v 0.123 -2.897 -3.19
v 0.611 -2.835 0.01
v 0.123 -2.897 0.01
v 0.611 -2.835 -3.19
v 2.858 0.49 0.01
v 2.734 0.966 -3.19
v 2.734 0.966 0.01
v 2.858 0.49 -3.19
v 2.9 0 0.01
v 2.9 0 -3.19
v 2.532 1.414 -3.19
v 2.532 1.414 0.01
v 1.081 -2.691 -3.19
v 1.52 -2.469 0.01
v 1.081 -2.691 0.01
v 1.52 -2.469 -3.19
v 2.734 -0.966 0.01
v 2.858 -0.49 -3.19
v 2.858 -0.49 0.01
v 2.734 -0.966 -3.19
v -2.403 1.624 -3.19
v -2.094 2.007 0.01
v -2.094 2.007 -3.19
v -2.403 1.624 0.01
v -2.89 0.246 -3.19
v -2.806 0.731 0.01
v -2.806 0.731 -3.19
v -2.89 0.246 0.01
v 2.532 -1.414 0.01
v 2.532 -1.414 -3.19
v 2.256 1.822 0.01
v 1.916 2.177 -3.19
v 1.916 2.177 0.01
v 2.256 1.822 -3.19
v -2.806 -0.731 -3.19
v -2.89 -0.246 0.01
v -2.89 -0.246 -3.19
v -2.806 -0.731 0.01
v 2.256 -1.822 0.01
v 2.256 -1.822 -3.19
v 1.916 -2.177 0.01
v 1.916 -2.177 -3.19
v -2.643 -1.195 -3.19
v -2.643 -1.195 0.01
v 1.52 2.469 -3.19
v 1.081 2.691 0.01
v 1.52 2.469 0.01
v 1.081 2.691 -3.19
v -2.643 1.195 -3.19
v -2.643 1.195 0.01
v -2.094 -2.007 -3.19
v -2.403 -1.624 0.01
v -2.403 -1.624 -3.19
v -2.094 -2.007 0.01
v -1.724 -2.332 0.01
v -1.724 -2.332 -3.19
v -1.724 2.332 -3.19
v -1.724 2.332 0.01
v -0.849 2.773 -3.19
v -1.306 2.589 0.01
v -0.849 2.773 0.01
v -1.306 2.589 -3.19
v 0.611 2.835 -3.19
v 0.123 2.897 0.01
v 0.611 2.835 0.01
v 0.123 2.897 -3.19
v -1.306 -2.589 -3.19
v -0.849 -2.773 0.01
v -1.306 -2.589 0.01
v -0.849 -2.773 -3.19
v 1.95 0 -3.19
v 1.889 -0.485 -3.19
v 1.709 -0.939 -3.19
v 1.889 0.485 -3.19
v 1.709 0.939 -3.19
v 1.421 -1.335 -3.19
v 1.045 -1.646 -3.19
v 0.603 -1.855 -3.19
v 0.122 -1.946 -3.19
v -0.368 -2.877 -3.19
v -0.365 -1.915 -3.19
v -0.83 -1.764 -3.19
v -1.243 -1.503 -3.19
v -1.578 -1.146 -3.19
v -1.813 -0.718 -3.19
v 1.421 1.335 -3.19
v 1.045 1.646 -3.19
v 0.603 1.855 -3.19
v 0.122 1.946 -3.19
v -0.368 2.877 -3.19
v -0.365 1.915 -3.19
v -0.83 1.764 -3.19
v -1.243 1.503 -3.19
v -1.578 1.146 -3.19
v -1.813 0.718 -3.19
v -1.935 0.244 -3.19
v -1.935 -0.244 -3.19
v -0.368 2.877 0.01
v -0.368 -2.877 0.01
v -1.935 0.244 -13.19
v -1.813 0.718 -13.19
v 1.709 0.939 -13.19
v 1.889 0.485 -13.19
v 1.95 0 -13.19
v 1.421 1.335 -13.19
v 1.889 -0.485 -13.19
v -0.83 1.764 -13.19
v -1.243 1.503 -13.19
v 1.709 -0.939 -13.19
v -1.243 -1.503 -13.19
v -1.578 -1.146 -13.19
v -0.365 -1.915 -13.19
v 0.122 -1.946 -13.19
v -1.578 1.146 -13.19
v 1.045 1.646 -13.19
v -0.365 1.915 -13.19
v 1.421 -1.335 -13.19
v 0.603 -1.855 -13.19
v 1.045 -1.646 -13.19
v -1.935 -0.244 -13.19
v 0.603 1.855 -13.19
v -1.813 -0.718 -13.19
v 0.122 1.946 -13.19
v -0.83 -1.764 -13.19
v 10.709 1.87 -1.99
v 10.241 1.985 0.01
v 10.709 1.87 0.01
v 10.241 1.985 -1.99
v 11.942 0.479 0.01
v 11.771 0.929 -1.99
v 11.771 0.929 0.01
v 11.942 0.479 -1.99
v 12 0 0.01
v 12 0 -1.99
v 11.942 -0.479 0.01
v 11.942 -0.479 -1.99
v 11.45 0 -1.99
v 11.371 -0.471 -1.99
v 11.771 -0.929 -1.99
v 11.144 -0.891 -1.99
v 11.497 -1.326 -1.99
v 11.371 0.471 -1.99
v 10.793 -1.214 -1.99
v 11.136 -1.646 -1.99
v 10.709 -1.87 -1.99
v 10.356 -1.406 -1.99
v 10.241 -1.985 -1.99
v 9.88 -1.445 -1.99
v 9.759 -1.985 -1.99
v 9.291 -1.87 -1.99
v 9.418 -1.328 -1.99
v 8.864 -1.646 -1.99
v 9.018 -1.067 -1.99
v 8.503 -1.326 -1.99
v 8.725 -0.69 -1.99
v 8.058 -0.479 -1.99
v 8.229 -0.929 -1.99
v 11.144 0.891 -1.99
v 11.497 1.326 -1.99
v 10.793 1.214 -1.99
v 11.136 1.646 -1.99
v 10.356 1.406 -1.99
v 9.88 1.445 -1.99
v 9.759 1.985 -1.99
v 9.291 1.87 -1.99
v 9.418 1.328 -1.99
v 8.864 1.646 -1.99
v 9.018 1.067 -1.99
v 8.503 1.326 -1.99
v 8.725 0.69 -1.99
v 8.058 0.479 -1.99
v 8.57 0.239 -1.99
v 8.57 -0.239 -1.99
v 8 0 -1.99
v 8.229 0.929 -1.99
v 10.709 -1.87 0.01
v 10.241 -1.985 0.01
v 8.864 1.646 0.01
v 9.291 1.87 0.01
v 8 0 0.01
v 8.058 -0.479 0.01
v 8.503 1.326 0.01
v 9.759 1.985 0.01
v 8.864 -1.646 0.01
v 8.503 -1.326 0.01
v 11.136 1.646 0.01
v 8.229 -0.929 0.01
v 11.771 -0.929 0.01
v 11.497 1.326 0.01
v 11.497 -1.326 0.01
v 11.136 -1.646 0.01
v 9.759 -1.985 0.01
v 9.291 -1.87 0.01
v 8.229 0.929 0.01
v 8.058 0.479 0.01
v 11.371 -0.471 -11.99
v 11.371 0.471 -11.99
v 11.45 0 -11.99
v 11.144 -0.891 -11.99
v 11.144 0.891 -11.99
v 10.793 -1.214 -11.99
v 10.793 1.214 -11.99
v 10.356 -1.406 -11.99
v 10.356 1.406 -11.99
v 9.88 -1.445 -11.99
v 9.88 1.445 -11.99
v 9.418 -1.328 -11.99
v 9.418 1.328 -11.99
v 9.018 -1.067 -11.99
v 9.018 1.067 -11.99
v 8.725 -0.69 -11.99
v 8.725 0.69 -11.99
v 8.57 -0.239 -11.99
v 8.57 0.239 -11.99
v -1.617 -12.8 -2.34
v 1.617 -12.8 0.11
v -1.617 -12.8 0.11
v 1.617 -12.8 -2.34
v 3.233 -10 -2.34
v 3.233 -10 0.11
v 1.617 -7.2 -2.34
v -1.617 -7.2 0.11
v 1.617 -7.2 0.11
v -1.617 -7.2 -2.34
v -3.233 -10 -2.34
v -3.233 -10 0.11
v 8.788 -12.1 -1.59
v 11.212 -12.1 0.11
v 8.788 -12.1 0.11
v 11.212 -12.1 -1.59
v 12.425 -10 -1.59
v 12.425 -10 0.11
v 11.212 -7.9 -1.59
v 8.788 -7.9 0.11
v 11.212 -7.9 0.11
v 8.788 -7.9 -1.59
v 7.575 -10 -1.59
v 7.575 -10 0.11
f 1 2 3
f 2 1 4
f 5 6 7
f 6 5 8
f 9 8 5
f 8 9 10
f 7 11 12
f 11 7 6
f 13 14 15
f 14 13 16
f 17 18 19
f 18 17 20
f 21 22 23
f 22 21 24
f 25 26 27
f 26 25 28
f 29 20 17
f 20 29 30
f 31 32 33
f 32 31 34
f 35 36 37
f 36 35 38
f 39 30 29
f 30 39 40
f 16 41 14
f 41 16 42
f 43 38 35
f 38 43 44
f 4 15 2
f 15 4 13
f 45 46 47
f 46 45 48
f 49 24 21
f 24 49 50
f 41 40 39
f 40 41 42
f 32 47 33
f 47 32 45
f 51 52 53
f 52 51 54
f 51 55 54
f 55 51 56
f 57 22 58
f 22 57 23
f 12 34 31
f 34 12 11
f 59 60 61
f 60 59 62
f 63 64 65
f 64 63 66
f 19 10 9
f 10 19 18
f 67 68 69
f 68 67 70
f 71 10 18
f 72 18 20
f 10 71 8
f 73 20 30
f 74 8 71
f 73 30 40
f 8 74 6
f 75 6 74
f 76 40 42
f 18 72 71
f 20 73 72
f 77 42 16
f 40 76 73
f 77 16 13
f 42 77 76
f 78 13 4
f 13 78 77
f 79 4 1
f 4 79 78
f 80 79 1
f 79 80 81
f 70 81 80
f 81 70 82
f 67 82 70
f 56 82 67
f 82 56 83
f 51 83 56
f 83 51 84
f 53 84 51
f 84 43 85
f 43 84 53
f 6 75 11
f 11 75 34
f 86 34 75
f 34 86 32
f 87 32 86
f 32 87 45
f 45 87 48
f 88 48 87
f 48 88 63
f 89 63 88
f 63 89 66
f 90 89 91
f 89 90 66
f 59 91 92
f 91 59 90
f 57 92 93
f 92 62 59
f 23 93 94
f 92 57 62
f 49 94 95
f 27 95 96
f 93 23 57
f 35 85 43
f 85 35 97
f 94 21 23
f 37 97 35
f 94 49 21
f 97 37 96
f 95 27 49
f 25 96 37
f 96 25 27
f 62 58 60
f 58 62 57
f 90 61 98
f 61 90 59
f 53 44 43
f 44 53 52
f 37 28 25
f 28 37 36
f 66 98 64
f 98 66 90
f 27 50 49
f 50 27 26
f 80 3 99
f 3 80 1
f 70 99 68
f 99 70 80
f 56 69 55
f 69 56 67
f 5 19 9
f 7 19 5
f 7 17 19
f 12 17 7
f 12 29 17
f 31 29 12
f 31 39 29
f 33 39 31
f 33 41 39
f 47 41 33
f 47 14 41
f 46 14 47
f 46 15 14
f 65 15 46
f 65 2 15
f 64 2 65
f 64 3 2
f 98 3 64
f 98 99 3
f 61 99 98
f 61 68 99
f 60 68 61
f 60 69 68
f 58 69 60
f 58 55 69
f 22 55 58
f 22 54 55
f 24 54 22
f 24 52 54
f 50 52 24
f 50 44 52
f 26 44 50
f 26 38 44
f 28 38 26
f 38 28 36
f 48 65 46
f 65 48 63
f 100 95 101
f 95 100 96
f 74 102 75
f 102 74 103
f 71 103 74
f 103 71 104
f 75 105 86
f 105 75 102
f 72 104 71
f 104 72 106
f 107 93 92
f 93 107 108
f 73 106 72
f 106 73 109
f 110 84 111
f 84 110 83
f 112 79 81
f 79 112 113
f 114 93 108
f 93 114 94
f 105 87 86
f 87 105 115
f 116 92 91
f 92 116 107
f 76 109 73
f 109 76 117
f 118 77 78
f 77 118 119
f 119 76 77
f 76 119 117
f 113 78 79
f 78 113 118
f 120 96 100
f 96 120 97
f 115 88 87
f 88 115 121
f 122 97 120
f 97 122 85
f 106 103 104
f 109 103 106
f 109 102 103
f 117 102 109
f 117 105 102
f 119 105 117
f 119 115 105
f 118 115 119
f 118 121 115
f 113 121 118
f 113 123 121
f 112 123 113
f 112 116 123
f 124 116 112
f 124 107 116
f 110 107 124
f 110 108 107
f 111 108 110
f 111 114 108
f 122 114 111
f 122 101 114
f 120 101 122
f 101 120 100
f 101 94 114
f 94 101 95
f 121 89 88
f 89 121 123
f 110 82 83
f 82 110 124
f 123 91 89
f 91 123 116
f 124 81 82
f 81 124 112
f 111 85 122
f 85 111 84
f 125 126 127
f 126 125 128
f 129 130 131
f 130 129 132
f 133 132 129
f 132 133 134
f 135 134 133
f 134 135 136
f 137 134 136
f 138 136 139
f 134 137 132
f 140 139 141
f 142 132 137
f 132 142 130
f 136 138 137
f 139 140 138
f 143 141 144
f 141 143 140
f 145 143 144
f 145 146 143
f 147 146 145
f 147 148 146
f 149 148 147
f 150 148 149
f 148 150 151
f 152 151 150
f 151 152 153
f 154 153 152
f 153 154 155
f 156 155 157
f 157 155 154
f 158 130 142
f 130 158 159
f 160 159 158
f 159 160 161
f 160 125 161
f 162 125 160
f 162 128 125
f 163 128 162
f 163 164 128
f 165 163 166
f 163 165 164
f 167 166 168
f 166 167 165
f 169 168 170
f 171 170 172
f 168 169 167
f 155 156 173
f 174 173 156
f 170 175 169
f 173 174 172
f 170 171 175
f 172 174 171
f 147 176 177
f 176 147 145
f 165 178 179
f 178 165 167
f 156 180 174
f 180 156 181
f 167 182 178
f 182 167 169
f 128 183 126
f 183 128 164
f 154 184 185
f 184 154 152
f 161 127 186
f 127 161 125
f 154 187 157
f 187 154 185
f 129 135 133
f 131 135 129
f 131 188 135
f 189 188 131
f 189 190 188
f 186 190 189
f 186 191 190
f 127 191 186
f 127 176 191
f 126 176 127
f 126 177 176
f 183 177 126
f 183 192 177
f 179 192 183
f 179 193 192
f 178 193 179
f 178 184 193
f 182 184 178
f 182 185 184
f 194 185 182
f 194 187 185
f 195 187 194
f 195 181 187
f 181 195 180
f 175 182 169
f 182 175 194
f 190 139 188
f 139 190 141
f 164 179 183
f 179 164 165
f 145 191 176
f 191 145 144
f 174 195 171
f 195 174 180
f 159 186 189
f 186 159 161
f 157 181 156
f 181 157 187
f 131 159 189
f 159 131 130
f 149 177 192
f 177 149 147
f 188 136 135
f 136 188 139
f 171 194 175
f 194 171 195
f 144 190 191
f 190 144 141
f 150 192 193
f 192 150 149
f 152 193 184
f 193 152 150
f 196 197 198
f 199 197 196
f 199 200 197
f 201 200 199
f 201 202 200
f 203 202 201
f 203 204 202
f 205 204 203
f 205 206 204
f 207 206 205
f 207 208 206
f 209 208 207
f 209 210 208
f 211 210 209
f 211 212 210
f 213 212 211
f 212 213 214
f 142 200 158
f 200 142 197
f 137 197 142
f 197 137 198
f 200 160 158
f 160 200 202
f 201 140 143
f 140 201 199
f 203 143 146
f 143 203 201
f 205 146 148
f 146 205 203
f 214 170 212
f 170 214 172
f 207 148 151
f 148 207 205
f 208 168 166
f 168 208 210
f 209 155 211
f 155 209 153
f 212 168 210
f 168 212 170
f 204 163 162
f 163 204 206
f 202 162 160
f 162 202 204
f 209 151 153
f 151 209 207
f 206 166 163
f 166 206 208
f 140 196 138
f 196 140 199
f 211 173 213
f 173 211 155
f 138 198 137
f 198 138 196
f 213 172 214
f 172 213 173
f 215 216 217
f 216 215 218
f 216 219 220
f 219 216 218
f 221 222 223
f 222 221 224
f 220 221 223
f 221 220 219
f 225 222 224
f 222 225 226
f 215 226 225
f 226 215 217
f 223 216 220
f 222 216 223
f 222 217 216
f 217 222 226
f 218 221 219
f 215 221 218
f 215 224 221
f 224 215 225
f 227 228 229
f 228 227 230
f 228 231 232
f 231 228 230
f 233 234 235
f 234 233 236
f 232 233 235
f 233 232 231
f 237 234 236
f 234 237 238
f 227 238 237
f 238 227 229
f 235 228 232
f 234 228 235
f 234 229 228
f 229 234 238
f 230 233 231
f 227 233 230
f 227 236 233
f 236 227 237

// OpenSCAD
// file: ../Polygon.scad
//============================================================
// OpenSCAD
// Regular Convex Polygon Library
// Last Modified : 2015/10/28
//============================================================
/*

	Definition

	N = Number of Side N >=3
	A = apothem
		radius of inside circle
	R = circumradius
		Radius of outside circle
	S = Side
		Lenght of a side

	Build polygon with the Apothem :
	N and A is known
	Need to calculate S then R
	use $fn

	Build Polygon with Circumradius
	N and R known
	use $fn

	Build Polygon with Side
	N and S Known
	Need to calculate R and optionaly A
	use $fn	

	TO DO
    Control result

	For more information :
	http://en.wikipedia.org/wiki/Regular_polygon

*/

//------------------------------------------------------------
//
//------------------------------------------------------------
Demo();

//------------------------------------------------------------
// Demo
//------------------------------------------------------------
module Demo()
{
	inch = 25.4;	// 25.4mm
	// A = apothem - it's a RADIUS !
	// For a bolt of 4 inches spécify A=2*inch
	//Polygon(N=7,A=2*inch,h=0);	// 4 inches radius Polygon
	//Polygon(N=7,A=49.8365,h=0);
	//Trigon(A=50,h=10);			// N=3
	//Dodecagon(A=50,h=0);			// N=12

    //rotate([0,0,360/7/2])
	//Nonagon(R=55.3144,h=10,debug=true);

	//Polygon(N=6,A=60,h=0,debug=false);
	//Polygon(N=6,A=60,h=5,debug=true);

    Enneagon(A=50);
}


//------------------------------------------------------------
// Polygon : 
//------------------------------------------------------------
module Polygon(N=3,A=0,R=0,S=0,h=0,debug=false)
{
	N = ( N < 3 ? 3 : N );

	angle = 360/N;
	angleA = angle/2;

	if (debug)
	{
		echo("N = ", N);
		echo("A = ", A);
		echo("S = ", S);
		echo("R = ", R);
	}

	if ( A > 0 )		// if A assign R and S
	{
        S = 2 * A * tan(angleA);							// assign
		//R = (S/2) / sin(angleA);						// no assign ???
		R = ( A * tan(angleA) ) / sin(angleA);		// asign
		_Build_Polygon(N=N,R=R,h=h);
		if (debug)
		{
			echo("aN = ", N);
			echo("aA = ", A);
			echo("aS = ", S);
			echo("aR = ", R);
			#cylinder(r=A,h=h+1,center=true,$fn=150);
			%cylinder(r=R,h=h+1,center=true,$fn=150);
		}
	}
	else
	{
		if ( S > 0 )		// if S assign R and A
		{
			R = (S/2) / sin(angleA);			// assign
			A = S / ( 2 * tan(angleA) );		// assign
            _Build_Polygon(N=N,R=R,h=h);
			if (debug)
			{
				echo("sN = ", N);
				echo("sA = ", A);
				echo("sS = ", S);
				echo("sR = ", R);
				#cylinder(r=A,h=h+1,center=true,$fn=150);
				%cylinder(r=R,h=h+1,center=true,$fn=150);
			}
		}
		else
		{
			if ( R == 0 )		// default
			{
				S = 2 * R * sin(angleA);			// no assign ???
				A = S / ( 2 * tan(angleA) );		// no assign ???
				_Build_Polygon(N=N,h=h);
				if (debug)
				{
					echo("0N = ", N);
					echo("0A = ", A);
					echo("0S = ", S);
					echo("0R = ", R);
					#cylinder(r=A,h=h+1,center=true,$fn=150);
					%cylinder(r=R,h=h+1,center=true,$fn=150);
				}
			}
			else		// build with R
			{
				S = 2 * R * sin(angleA);
				A = S / ( 2 * tan(angleA) );			// no assign ???
				//A = R * ( sin(angleA) / tan(angleA) )	// no assign ???
				_Build_Polygon(N=N,R=R,h=h);
				if (debug)
				{
					echo("rN = ", N);
					echo("rA = ", A);
					echo("rS = ", S);
					echo("rR = ", R);
					%cylinder(r=R,h=h+1,center=true,$fn=150);
				}
			}
		}
	}

	if (debug)
	{
		echo("fN = ", N);
		echo("fA = ", A);
		echo("fS = ", S);
		echo("fR = ", R);
	}
}

//------------------------------------------------------------
// Build
//------------------------------------------------------------
module _Build_Polygon(N=3,R=1,h=0)
{
	if (h > 0)
	{
		// 3D primitive h>0
		cylinder(r=R,h=h,$fn=N,center=true);
	}
	else
	{
		// 2D primitive h=0
		circle(r=R,$fn=N,center=true);
	}
}

//------------------------------------------------------------
// Building lots from N=3, N=N+1
// http://en.wikipedia.org/wiki/Polygon
//------------------------------------------------------------

// 3 sides
module Trigon(A=0,R=0,S=0,h=0,debug=false)
	{Polygon(N=3,A=A,R=R,S=S,h=h,debug=debug);}

module Triangle(A=0,R=0,S=0,h=0,debug=false)
	{Polygon(N=3,A=A,R=R,S=S,h=h,debug=debug);}

// 4 sides
module Tetragon(A=0,R=0,S=0,h=0,debug=false)
	{Polygon(N=4,A=A,R=R,S=S,h=h,debug=debug);}

module Quadrilateral(A=0,R=0,S=0,h=0,debug=false)
	{Polygon(N=4,A=A,R=R,S=S,h=h,debug=debug);}

module Quadrangle(A=0,R=0,S=0,h=0,debug=false)
	{Polygon(N=4,A=A,R=R,S=S,h=h,debug=debug);}

// 5 sides
module Pentagon(A=0,R=0,S=0,h=0,debug=false)
	{Polygon(N=5,A=A,R=R,S=S,h=h,debug=debug);}

// 6 sides
module Hexagon(A=0,R=0,S=0,h=0,debug=false)
	{Polygon(N=6,A=A,R=R,S=S,h=h,debug=debug);}

// 7 sides
module Heptagon(A=0,R=0,S=0,h=0,debug=false)
	{Polygon(N=7,A=A,R=R,S=S,h=h,debug=debug);}

// 8 sides
module Octagon(A=0,R=0,S=0,h=0,debug=false)
	{Polygon(N=8,A=A,R=R,S=S,h=h,debug=debug);}

// 9 sides
module Enneagon(A=0,R=0,S=0,h=0,debug=false)
	{Polygon(N=9,A=A,R=R,S=S,h=h,debug=debug);}

module Nonagon(A=0,R=0,S=0,h=0,debug=false)
	{Polygon(N=9,A=A,R=R,S=S,h=h,debug=debug);}

// 10 sides
module Decagon(A=0,R=0,S=0,h=0,debug=false)
	{Polygon(N=10,A=A,R=R,S=S,h=h,debug=debug);}

// 11 sides
module Handecagon(A=0,R=0,S=0,h=0,debug=false)
	{Polygon(N=11,A=A,R=R,S=S,h=h,debug=debug);}

// 12 sides
module Dodecagon(A=0,R=0,S=0,h=0,debug=false)
	{Polygon(N=12,A=A,R=R,S=S,h=h,debug=debug);}

// ...

// 100 sides
module Hectogon(A=0,R=0,S=0,h=0,debug=false)
	{Polygon(N=100,A=A,R=R,S=S,h=h,debug=debug);}

//==EOF=======================================================
// file: ../Bolt.scad
include <defaults.scad>;

module Bolt(
  l=10,
  h_head=5,
  d_head=10,
  d=5,
  tolerance=default_metric_tolerance,
  inset=1,
  extra_tolerance=default_bolt_extra_tolerance
) {
  r_head = d_head/2;
  r = d/2;

  translate([0, 0, -inset*h_head]){
    translate([0, 0, 0.01])
    cylinder(r=r_head+tolerance*2, h=h_head);

    translate([0, 0, -l+0.01])
    cylinder(r=r+tolerance*2+extra_tolerance, h=l+0.01);
  }
}
// file: ../Nut.scad
include <defaults.scad>;
use <Polygon.scad>;

module Nut(
  h=10,
  A=10,
  tolerance=default_metric_tolerance,
  inset=1
) {
  translate([0, 0, -h/2+0.01+((1-inset)*h)])
  Hexagon(
    A=A+tolerance,
    h=h+tolerance*2
  );
}
// file: ../defaults.scad
default_metric_tolerance = 0.1;
default_bolt_extra_tolerance = 0.25;
// file: ../M2.scad
include <defaults.scad>;
use <Nut.scad>;
use <Bolt.scad>;

h_nut_m2 = 1.5;
a_nut_m2 = 4;
A_nut_m2 = a_nut_m2 / 2;
d_head_m2 = 3.6;
h_head_m2 = 2;
d_m2 = 2; //1.86;

module NutM2(tolerance=default_metric_tolerance, h=h_nut_m2, inset=1) {
  Nut(h=h, A=A_nut_m2, tolerance=tolerance, inset=inset);
}

module BoltM2(l=10, tolerance=default_metric_tolerance, inset=1) {
  Bolt(l=l, h_head=h_head_m2, d_head=d_head_m2, d=d_m2, tolerance=tolerance, inset=inset);
}
// file: ../M3.scad
include <defaults.scad>;
use <Nut.scad>;
use <Bolt.scad>;

h_nut_m3 = 2.25;
a_nut_m3 = 5.4;
A_nut_m3 = a_nut_m3 / 2;
d_head_m3 = 5.4;
h_head_m3 = 3.2;
d_m3 = 3;

module NutM3(tolerance=default_metric_tolerance, h=h_nut_m3, inset=1) {
  Nut(h=h, A=A_nut_m3, tolerance=tolerance, inset=inset);
}

module BoltM3(l=10, tolerance=default_metric_tolerance, inset=1) {
  Bolt(l=l, h_head=h_head_m3, d_head=d_head_m3, d=d_m3, tolerance=tolerance, inset=inset);
}
// main file
use <../M3.scad>;
use <../M2.scad>;

$fs = 0.5;
$fa = 2;

BoltM3();

translate([0, -10, 0])
NutM3();

translate([10, 0, 0])
BoltM2();

translate([10, -10, 0])
NutM2();
